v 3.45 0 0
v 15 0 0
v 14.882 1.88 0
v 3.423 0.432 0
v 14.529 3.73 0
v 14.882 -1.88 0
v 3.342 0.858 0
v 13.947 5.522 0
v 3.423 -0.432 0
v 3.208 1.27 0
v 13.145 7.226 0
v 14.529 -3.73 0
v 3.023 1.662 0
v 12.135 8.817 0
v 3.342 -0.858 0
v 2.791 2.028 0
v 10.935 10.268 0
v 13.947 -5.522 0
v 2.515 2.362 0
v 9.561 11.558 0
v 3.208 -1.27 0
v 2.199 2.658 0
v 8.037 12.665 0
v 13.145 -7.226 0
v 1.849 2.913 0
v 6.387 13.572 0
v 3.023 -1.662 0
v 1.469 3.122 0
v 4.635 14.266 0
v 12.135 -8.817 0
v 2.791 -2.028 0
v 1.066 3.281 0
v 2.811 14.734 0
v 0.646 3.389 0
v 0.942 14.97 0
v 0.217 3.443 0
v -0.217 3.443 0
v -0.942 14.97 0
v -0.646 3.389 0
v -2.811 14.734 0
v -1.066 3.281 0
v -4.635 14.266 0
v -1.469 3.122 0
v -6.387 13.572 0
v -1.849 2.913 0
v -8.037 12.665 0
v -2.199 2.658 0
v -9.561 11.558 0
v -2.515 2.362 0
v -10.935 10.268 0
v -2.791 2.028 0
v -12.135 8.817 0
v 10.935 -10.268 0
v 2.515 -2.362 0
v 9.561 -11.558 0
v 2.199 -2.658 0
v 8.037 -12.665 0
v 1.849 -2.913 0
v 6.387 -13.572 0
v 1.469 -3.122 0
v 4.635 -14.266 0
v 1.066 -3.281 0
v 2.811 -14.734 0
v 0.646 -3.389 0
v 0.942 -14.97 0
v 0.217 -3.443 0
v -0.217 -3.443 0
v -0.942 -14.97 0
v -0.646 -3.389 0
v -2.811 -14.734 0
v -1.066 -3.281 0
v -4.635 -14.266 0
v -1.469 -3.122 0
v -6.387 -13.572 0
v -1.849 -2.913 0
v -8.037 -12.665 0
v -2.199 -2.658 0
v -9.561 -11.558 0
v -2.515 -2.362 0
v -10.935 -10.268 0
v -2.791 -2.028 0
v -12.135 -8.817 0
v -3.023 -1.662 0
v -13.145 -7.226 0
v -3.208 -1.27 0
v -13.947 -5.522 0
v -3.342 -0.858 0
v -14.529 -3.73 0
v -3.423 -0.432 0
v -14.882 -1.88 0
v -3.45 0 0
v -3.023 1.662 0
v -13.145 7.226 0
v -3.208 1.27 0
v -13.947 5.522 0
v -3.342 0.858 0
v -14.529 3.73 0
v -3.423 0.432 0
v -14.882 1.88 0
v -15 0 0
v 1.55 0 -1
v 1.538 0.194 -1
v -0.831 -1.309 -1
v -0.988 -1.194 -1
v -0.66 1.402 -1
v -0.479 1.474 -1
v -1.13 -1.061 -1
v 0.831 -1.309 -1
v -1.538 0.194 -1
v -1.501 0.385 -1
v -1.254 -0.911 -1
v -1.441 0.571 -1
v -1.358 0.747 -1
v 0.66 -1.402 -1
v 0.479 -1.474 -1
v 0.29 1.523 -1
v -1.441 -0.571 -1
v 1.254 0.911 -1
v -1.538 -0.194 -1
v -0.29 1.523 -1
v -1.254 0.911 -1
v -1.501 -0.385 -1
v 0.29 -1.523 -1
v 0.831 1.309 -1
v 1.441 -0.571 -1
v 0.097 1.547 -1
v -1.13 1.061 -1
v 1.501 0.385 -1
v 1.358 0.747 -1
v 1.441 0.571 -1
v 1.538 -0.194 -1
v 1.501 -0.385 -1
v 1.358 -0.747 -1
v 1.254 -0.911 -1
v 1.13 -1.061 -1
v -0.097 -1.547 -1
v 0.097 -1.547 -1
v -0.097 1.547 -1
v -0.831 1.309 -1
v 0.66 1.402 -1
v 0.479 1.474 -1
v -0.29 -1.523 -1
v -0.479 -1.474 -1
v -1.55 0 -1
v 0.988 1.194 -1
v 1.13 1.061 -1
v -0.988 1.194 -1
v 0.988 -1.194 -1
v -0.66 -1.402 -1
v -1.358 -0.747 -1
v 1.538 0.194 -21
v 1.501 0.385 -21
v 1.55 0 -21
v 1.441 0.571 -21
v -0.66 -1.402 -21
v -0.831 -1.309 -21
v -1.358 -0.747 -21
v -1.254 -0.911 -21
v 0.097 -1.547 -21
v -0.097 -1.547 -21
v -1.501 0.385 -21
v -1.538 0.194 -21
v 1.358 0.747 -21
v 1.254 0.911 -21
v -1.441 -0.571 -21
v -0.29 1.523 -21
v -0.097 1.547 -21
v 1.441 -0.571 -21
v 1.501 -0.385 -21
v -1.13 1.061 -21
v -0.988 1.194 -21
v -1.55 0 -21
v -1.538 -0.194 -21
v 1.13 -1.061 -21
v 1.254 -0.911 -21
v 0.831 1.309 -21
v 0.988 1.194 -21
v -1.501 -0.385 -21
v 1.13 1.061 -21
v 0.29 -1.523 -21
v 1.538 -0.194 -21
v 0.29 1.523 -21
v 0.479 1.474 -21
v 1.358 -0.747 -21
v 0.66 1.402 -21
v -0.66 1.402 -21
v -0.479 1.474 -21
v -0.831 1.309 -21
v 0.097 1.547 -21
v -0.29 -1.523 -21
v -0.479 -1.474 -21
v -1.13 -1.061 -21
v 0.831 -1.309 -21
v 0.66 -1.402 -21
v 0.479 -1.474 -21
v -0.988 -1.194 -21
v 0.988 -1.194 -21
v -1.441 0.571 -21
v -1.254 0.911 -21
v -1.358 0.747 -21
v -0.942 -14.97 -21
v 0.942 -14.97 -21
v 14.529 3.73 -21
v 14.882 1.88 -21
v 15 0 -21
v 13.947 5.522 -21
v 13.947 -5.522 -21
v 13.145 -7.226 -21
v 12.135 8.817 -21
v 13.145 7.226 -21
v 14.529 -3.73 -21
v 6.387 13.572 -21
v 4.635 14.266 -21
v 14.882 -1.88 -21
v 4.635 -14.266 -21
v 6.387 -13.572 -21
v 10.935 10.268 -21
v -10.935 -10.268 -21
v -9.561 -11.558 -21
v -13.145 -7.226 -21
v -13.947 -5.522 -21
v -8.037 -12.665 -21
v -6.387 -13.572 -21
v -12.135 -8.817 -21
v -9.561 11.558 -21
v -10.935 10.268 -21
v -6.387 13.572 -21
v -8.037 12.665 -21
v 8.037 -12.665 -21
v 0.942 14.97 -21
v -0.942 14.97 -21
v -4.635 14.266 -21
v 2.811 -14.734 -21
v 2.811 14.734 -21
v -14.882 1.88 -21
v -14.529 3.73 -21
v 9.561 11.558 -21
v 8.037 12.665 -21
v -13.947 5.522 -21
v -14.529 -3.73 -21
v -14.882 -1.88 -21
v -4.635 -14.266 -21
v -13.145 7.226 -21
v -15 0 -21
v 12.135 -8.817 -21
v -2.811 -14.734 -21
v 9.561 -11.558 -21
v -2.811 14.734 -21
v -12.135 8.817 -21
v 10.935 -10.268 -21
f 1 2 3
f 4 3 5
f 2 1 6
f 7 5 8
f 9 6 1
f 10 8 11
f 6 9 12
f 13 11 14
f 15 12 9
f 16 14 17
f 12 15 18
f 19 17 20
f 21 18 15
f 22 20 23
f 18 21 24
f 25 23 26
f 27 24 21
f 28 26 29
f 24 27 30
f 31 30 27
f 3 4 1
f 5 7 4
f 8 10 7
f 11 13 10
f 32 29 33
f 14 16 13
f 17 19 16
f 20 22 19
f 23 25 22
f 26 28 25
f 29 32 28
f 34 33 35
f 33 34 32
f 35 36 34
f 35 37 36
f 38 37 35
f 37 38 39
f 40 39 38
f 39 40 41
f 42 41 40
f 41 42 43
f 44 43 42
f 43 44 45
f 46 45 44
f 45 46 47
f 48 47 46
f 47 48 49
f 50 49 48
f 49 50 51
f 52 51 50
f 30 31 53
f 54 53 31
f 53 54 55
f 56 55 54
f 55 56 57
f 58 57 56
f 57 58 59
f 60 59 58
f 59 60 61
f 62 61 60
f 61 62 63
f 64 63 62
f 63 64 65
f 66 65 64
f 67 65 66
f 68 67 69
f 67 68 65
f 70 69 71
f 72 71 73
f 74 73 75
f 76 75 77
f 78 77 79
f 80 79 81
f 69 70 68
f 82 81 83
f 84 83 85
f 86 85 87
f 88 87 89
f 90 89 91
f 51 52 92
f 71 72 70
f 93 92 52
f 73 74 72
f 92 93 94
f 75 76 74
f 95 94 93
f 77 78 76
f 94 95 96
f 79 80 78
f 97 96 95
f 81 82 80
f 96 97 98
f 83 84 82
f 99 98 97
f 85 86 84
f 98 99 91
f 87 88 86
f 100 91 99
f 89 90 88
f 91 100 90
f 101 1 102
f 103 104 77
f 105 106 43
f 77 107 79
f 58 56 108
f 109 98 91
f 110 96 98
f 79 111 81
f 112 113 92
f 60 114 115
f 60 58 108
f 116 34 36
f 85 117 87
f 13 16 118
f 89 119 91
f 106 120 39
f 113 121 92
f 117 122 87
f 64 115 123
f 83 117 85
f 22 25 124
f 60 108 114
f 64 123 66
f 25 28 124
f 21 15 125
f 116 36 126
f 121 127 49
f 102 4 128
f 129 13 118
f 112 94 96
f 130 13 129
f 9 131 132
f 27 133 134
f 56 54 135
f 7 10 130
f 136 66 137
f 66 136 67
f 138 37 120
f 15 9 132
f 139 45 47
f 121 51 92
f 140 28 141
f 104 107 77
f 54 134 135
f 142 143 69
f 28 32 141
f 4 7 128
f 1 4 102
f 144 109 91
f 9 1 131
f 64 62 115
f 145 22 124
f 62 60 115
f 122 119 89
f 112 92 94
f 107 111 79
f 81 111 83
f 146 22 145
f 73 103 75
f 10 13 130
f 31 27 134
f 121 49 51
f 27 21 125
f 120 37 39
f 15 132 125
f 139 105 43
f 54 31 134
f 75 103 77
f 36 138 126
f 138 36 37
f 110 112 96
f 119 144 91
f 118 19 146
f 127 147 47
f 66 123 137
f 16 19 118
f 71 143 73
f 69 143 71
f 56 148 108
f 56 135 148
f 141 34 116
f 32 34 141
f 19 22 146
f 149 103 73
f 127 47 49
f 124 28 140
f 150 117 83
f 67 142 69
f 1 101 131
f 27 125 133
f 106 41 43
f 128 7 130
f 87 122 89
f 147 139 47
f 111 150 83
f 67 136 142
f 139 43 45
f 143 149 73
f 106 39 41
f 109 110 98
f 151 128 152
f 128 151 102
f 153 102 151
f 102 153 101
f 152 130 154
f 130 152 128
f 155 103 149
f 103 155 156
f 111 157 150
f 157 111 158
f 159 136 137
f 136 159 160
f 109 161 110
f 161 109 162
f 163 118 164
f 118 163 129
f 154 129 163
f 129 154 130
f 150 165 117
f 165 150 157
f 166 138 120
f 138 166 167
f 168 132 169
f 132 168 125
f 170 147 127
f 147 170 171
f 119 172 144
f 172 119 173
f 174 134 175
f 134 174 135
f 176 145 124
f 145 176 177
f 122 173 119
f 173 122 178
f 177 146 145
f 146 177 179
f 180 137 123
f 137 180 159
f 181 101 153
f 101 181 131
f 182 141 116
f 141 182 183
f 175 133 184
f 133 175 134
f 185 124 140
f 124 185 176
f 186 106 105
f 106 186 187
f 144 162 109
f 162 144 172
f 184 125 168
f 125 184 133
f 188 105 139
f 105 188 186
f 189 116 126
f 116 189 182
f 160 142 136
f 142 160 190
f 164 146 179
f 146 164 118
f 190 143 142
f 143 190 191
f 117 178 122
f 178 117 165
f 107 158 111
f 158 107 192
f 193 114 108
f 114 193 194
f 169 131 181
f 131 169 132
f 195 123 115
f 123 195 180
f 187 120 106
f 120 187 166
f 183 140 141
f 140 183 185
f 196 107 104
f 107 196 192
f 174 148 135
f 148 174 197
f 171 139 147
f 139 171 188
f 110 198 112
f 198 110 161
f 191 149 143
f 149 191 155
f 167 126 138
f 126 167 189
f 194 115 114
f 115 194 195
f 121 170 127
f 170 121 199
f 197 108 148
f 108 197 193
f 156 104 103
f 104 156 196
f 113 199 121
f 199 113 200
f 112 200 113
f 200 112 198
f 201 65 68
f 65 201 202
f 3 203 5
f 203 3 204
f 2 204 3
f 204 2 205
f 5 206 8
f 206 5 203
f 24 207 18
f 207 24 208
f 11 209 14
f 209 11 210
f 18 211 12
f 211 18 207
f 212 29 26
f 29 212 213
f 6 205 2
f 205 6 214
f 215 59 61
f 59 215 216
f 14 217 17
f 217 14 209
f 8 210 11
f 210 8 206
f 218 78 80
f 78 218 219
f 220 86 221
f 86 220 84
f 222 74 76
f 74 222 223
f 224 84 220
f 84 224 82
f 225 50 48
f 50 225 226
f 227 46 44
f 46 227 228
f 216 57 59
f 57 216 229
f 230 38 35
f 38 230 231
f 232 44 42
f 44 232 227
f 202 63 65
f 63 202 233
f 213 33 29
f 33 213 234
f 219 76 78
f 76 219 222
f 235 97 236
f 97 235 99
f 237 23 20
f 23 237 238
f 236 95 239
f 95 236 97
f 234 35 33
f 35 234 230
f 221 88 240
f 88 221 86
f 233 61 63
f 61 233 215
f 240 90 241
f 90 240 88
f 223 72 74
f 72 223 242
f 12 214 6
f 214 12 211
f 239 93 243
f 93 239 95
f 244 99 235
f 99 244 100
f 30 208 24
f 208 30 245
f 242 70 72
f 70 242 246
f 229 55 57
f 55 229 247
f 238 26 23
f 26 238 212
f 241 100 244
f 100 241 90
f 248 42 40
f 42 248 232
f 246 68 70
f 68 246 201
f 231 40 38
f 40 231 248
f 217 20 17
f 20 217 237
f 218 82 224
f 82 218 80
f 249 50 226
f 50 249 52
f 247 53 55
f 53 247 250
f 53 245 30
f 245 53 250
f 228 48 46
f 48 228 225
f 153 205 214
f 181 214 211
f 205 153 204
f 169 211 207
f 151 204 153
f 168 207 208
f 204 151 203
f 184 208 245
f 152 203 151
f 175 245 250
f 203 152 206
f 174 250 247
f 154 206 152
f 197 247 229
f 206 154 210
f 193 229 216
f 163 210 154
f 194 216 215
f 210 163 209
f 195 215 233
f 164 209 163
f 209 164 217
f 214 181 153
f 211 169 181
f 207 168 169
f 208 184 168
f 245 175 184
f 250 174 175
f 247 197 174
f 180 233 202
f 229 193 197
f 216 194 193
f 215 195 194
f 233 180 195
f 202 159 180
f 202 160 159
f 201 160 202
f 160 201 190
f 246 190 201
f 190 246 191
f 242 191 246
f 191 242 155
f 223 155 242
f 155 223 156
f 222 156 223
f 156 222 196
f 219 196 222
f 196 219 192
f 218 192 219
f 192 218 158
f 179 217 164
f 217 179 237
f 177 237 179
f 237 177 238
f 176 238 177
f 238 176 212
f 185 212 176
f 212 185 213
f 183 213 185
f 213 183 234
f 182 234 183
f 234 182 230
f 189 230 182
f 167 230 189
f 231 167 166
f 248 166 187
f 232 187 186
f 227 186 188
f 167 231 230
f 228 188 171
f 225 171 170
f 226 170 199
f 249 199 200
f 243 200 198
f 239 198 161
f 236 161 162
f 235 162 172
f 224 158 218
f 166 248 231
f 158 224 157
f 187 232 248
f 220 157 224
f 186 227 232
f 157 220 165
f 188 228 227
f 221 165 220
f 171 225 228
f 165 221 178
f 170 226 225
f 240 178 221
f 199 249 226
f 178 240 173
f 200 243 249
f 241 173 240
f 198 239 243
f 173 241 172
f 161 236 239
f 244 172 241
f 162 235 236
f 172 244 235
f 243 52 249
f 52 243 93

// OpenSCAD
$fn = 50;

difference() {
	union() {
		translate(v = [0, 0, -21.0]) {
			cylinder(h = 21, r = 15.0);
		}
	}
	union() {
		translate(v = [0, 0, 0]) {
			rotate(a = [0, 0, 0]) {
				difference() {
					union() {
						translate(v = [0, 0, -24.0]) {
							cylinder(h = 24, r = 1.25);
						}
						translate(v = [0, 0, -1.0]) {
							cylinder(h = 1.0, r1 = 1.55, r2 = 3.45);
						}
						translate(v = [0, 0, -24.0]) {
							cylinder(h = 24, r = 1.55);
						}
						translate(v = [0, 0, -24.0]) {
							cylinder(h = 24, r = 1.25);
						}
					}
					union();
				}
			}
		}
	}
}
